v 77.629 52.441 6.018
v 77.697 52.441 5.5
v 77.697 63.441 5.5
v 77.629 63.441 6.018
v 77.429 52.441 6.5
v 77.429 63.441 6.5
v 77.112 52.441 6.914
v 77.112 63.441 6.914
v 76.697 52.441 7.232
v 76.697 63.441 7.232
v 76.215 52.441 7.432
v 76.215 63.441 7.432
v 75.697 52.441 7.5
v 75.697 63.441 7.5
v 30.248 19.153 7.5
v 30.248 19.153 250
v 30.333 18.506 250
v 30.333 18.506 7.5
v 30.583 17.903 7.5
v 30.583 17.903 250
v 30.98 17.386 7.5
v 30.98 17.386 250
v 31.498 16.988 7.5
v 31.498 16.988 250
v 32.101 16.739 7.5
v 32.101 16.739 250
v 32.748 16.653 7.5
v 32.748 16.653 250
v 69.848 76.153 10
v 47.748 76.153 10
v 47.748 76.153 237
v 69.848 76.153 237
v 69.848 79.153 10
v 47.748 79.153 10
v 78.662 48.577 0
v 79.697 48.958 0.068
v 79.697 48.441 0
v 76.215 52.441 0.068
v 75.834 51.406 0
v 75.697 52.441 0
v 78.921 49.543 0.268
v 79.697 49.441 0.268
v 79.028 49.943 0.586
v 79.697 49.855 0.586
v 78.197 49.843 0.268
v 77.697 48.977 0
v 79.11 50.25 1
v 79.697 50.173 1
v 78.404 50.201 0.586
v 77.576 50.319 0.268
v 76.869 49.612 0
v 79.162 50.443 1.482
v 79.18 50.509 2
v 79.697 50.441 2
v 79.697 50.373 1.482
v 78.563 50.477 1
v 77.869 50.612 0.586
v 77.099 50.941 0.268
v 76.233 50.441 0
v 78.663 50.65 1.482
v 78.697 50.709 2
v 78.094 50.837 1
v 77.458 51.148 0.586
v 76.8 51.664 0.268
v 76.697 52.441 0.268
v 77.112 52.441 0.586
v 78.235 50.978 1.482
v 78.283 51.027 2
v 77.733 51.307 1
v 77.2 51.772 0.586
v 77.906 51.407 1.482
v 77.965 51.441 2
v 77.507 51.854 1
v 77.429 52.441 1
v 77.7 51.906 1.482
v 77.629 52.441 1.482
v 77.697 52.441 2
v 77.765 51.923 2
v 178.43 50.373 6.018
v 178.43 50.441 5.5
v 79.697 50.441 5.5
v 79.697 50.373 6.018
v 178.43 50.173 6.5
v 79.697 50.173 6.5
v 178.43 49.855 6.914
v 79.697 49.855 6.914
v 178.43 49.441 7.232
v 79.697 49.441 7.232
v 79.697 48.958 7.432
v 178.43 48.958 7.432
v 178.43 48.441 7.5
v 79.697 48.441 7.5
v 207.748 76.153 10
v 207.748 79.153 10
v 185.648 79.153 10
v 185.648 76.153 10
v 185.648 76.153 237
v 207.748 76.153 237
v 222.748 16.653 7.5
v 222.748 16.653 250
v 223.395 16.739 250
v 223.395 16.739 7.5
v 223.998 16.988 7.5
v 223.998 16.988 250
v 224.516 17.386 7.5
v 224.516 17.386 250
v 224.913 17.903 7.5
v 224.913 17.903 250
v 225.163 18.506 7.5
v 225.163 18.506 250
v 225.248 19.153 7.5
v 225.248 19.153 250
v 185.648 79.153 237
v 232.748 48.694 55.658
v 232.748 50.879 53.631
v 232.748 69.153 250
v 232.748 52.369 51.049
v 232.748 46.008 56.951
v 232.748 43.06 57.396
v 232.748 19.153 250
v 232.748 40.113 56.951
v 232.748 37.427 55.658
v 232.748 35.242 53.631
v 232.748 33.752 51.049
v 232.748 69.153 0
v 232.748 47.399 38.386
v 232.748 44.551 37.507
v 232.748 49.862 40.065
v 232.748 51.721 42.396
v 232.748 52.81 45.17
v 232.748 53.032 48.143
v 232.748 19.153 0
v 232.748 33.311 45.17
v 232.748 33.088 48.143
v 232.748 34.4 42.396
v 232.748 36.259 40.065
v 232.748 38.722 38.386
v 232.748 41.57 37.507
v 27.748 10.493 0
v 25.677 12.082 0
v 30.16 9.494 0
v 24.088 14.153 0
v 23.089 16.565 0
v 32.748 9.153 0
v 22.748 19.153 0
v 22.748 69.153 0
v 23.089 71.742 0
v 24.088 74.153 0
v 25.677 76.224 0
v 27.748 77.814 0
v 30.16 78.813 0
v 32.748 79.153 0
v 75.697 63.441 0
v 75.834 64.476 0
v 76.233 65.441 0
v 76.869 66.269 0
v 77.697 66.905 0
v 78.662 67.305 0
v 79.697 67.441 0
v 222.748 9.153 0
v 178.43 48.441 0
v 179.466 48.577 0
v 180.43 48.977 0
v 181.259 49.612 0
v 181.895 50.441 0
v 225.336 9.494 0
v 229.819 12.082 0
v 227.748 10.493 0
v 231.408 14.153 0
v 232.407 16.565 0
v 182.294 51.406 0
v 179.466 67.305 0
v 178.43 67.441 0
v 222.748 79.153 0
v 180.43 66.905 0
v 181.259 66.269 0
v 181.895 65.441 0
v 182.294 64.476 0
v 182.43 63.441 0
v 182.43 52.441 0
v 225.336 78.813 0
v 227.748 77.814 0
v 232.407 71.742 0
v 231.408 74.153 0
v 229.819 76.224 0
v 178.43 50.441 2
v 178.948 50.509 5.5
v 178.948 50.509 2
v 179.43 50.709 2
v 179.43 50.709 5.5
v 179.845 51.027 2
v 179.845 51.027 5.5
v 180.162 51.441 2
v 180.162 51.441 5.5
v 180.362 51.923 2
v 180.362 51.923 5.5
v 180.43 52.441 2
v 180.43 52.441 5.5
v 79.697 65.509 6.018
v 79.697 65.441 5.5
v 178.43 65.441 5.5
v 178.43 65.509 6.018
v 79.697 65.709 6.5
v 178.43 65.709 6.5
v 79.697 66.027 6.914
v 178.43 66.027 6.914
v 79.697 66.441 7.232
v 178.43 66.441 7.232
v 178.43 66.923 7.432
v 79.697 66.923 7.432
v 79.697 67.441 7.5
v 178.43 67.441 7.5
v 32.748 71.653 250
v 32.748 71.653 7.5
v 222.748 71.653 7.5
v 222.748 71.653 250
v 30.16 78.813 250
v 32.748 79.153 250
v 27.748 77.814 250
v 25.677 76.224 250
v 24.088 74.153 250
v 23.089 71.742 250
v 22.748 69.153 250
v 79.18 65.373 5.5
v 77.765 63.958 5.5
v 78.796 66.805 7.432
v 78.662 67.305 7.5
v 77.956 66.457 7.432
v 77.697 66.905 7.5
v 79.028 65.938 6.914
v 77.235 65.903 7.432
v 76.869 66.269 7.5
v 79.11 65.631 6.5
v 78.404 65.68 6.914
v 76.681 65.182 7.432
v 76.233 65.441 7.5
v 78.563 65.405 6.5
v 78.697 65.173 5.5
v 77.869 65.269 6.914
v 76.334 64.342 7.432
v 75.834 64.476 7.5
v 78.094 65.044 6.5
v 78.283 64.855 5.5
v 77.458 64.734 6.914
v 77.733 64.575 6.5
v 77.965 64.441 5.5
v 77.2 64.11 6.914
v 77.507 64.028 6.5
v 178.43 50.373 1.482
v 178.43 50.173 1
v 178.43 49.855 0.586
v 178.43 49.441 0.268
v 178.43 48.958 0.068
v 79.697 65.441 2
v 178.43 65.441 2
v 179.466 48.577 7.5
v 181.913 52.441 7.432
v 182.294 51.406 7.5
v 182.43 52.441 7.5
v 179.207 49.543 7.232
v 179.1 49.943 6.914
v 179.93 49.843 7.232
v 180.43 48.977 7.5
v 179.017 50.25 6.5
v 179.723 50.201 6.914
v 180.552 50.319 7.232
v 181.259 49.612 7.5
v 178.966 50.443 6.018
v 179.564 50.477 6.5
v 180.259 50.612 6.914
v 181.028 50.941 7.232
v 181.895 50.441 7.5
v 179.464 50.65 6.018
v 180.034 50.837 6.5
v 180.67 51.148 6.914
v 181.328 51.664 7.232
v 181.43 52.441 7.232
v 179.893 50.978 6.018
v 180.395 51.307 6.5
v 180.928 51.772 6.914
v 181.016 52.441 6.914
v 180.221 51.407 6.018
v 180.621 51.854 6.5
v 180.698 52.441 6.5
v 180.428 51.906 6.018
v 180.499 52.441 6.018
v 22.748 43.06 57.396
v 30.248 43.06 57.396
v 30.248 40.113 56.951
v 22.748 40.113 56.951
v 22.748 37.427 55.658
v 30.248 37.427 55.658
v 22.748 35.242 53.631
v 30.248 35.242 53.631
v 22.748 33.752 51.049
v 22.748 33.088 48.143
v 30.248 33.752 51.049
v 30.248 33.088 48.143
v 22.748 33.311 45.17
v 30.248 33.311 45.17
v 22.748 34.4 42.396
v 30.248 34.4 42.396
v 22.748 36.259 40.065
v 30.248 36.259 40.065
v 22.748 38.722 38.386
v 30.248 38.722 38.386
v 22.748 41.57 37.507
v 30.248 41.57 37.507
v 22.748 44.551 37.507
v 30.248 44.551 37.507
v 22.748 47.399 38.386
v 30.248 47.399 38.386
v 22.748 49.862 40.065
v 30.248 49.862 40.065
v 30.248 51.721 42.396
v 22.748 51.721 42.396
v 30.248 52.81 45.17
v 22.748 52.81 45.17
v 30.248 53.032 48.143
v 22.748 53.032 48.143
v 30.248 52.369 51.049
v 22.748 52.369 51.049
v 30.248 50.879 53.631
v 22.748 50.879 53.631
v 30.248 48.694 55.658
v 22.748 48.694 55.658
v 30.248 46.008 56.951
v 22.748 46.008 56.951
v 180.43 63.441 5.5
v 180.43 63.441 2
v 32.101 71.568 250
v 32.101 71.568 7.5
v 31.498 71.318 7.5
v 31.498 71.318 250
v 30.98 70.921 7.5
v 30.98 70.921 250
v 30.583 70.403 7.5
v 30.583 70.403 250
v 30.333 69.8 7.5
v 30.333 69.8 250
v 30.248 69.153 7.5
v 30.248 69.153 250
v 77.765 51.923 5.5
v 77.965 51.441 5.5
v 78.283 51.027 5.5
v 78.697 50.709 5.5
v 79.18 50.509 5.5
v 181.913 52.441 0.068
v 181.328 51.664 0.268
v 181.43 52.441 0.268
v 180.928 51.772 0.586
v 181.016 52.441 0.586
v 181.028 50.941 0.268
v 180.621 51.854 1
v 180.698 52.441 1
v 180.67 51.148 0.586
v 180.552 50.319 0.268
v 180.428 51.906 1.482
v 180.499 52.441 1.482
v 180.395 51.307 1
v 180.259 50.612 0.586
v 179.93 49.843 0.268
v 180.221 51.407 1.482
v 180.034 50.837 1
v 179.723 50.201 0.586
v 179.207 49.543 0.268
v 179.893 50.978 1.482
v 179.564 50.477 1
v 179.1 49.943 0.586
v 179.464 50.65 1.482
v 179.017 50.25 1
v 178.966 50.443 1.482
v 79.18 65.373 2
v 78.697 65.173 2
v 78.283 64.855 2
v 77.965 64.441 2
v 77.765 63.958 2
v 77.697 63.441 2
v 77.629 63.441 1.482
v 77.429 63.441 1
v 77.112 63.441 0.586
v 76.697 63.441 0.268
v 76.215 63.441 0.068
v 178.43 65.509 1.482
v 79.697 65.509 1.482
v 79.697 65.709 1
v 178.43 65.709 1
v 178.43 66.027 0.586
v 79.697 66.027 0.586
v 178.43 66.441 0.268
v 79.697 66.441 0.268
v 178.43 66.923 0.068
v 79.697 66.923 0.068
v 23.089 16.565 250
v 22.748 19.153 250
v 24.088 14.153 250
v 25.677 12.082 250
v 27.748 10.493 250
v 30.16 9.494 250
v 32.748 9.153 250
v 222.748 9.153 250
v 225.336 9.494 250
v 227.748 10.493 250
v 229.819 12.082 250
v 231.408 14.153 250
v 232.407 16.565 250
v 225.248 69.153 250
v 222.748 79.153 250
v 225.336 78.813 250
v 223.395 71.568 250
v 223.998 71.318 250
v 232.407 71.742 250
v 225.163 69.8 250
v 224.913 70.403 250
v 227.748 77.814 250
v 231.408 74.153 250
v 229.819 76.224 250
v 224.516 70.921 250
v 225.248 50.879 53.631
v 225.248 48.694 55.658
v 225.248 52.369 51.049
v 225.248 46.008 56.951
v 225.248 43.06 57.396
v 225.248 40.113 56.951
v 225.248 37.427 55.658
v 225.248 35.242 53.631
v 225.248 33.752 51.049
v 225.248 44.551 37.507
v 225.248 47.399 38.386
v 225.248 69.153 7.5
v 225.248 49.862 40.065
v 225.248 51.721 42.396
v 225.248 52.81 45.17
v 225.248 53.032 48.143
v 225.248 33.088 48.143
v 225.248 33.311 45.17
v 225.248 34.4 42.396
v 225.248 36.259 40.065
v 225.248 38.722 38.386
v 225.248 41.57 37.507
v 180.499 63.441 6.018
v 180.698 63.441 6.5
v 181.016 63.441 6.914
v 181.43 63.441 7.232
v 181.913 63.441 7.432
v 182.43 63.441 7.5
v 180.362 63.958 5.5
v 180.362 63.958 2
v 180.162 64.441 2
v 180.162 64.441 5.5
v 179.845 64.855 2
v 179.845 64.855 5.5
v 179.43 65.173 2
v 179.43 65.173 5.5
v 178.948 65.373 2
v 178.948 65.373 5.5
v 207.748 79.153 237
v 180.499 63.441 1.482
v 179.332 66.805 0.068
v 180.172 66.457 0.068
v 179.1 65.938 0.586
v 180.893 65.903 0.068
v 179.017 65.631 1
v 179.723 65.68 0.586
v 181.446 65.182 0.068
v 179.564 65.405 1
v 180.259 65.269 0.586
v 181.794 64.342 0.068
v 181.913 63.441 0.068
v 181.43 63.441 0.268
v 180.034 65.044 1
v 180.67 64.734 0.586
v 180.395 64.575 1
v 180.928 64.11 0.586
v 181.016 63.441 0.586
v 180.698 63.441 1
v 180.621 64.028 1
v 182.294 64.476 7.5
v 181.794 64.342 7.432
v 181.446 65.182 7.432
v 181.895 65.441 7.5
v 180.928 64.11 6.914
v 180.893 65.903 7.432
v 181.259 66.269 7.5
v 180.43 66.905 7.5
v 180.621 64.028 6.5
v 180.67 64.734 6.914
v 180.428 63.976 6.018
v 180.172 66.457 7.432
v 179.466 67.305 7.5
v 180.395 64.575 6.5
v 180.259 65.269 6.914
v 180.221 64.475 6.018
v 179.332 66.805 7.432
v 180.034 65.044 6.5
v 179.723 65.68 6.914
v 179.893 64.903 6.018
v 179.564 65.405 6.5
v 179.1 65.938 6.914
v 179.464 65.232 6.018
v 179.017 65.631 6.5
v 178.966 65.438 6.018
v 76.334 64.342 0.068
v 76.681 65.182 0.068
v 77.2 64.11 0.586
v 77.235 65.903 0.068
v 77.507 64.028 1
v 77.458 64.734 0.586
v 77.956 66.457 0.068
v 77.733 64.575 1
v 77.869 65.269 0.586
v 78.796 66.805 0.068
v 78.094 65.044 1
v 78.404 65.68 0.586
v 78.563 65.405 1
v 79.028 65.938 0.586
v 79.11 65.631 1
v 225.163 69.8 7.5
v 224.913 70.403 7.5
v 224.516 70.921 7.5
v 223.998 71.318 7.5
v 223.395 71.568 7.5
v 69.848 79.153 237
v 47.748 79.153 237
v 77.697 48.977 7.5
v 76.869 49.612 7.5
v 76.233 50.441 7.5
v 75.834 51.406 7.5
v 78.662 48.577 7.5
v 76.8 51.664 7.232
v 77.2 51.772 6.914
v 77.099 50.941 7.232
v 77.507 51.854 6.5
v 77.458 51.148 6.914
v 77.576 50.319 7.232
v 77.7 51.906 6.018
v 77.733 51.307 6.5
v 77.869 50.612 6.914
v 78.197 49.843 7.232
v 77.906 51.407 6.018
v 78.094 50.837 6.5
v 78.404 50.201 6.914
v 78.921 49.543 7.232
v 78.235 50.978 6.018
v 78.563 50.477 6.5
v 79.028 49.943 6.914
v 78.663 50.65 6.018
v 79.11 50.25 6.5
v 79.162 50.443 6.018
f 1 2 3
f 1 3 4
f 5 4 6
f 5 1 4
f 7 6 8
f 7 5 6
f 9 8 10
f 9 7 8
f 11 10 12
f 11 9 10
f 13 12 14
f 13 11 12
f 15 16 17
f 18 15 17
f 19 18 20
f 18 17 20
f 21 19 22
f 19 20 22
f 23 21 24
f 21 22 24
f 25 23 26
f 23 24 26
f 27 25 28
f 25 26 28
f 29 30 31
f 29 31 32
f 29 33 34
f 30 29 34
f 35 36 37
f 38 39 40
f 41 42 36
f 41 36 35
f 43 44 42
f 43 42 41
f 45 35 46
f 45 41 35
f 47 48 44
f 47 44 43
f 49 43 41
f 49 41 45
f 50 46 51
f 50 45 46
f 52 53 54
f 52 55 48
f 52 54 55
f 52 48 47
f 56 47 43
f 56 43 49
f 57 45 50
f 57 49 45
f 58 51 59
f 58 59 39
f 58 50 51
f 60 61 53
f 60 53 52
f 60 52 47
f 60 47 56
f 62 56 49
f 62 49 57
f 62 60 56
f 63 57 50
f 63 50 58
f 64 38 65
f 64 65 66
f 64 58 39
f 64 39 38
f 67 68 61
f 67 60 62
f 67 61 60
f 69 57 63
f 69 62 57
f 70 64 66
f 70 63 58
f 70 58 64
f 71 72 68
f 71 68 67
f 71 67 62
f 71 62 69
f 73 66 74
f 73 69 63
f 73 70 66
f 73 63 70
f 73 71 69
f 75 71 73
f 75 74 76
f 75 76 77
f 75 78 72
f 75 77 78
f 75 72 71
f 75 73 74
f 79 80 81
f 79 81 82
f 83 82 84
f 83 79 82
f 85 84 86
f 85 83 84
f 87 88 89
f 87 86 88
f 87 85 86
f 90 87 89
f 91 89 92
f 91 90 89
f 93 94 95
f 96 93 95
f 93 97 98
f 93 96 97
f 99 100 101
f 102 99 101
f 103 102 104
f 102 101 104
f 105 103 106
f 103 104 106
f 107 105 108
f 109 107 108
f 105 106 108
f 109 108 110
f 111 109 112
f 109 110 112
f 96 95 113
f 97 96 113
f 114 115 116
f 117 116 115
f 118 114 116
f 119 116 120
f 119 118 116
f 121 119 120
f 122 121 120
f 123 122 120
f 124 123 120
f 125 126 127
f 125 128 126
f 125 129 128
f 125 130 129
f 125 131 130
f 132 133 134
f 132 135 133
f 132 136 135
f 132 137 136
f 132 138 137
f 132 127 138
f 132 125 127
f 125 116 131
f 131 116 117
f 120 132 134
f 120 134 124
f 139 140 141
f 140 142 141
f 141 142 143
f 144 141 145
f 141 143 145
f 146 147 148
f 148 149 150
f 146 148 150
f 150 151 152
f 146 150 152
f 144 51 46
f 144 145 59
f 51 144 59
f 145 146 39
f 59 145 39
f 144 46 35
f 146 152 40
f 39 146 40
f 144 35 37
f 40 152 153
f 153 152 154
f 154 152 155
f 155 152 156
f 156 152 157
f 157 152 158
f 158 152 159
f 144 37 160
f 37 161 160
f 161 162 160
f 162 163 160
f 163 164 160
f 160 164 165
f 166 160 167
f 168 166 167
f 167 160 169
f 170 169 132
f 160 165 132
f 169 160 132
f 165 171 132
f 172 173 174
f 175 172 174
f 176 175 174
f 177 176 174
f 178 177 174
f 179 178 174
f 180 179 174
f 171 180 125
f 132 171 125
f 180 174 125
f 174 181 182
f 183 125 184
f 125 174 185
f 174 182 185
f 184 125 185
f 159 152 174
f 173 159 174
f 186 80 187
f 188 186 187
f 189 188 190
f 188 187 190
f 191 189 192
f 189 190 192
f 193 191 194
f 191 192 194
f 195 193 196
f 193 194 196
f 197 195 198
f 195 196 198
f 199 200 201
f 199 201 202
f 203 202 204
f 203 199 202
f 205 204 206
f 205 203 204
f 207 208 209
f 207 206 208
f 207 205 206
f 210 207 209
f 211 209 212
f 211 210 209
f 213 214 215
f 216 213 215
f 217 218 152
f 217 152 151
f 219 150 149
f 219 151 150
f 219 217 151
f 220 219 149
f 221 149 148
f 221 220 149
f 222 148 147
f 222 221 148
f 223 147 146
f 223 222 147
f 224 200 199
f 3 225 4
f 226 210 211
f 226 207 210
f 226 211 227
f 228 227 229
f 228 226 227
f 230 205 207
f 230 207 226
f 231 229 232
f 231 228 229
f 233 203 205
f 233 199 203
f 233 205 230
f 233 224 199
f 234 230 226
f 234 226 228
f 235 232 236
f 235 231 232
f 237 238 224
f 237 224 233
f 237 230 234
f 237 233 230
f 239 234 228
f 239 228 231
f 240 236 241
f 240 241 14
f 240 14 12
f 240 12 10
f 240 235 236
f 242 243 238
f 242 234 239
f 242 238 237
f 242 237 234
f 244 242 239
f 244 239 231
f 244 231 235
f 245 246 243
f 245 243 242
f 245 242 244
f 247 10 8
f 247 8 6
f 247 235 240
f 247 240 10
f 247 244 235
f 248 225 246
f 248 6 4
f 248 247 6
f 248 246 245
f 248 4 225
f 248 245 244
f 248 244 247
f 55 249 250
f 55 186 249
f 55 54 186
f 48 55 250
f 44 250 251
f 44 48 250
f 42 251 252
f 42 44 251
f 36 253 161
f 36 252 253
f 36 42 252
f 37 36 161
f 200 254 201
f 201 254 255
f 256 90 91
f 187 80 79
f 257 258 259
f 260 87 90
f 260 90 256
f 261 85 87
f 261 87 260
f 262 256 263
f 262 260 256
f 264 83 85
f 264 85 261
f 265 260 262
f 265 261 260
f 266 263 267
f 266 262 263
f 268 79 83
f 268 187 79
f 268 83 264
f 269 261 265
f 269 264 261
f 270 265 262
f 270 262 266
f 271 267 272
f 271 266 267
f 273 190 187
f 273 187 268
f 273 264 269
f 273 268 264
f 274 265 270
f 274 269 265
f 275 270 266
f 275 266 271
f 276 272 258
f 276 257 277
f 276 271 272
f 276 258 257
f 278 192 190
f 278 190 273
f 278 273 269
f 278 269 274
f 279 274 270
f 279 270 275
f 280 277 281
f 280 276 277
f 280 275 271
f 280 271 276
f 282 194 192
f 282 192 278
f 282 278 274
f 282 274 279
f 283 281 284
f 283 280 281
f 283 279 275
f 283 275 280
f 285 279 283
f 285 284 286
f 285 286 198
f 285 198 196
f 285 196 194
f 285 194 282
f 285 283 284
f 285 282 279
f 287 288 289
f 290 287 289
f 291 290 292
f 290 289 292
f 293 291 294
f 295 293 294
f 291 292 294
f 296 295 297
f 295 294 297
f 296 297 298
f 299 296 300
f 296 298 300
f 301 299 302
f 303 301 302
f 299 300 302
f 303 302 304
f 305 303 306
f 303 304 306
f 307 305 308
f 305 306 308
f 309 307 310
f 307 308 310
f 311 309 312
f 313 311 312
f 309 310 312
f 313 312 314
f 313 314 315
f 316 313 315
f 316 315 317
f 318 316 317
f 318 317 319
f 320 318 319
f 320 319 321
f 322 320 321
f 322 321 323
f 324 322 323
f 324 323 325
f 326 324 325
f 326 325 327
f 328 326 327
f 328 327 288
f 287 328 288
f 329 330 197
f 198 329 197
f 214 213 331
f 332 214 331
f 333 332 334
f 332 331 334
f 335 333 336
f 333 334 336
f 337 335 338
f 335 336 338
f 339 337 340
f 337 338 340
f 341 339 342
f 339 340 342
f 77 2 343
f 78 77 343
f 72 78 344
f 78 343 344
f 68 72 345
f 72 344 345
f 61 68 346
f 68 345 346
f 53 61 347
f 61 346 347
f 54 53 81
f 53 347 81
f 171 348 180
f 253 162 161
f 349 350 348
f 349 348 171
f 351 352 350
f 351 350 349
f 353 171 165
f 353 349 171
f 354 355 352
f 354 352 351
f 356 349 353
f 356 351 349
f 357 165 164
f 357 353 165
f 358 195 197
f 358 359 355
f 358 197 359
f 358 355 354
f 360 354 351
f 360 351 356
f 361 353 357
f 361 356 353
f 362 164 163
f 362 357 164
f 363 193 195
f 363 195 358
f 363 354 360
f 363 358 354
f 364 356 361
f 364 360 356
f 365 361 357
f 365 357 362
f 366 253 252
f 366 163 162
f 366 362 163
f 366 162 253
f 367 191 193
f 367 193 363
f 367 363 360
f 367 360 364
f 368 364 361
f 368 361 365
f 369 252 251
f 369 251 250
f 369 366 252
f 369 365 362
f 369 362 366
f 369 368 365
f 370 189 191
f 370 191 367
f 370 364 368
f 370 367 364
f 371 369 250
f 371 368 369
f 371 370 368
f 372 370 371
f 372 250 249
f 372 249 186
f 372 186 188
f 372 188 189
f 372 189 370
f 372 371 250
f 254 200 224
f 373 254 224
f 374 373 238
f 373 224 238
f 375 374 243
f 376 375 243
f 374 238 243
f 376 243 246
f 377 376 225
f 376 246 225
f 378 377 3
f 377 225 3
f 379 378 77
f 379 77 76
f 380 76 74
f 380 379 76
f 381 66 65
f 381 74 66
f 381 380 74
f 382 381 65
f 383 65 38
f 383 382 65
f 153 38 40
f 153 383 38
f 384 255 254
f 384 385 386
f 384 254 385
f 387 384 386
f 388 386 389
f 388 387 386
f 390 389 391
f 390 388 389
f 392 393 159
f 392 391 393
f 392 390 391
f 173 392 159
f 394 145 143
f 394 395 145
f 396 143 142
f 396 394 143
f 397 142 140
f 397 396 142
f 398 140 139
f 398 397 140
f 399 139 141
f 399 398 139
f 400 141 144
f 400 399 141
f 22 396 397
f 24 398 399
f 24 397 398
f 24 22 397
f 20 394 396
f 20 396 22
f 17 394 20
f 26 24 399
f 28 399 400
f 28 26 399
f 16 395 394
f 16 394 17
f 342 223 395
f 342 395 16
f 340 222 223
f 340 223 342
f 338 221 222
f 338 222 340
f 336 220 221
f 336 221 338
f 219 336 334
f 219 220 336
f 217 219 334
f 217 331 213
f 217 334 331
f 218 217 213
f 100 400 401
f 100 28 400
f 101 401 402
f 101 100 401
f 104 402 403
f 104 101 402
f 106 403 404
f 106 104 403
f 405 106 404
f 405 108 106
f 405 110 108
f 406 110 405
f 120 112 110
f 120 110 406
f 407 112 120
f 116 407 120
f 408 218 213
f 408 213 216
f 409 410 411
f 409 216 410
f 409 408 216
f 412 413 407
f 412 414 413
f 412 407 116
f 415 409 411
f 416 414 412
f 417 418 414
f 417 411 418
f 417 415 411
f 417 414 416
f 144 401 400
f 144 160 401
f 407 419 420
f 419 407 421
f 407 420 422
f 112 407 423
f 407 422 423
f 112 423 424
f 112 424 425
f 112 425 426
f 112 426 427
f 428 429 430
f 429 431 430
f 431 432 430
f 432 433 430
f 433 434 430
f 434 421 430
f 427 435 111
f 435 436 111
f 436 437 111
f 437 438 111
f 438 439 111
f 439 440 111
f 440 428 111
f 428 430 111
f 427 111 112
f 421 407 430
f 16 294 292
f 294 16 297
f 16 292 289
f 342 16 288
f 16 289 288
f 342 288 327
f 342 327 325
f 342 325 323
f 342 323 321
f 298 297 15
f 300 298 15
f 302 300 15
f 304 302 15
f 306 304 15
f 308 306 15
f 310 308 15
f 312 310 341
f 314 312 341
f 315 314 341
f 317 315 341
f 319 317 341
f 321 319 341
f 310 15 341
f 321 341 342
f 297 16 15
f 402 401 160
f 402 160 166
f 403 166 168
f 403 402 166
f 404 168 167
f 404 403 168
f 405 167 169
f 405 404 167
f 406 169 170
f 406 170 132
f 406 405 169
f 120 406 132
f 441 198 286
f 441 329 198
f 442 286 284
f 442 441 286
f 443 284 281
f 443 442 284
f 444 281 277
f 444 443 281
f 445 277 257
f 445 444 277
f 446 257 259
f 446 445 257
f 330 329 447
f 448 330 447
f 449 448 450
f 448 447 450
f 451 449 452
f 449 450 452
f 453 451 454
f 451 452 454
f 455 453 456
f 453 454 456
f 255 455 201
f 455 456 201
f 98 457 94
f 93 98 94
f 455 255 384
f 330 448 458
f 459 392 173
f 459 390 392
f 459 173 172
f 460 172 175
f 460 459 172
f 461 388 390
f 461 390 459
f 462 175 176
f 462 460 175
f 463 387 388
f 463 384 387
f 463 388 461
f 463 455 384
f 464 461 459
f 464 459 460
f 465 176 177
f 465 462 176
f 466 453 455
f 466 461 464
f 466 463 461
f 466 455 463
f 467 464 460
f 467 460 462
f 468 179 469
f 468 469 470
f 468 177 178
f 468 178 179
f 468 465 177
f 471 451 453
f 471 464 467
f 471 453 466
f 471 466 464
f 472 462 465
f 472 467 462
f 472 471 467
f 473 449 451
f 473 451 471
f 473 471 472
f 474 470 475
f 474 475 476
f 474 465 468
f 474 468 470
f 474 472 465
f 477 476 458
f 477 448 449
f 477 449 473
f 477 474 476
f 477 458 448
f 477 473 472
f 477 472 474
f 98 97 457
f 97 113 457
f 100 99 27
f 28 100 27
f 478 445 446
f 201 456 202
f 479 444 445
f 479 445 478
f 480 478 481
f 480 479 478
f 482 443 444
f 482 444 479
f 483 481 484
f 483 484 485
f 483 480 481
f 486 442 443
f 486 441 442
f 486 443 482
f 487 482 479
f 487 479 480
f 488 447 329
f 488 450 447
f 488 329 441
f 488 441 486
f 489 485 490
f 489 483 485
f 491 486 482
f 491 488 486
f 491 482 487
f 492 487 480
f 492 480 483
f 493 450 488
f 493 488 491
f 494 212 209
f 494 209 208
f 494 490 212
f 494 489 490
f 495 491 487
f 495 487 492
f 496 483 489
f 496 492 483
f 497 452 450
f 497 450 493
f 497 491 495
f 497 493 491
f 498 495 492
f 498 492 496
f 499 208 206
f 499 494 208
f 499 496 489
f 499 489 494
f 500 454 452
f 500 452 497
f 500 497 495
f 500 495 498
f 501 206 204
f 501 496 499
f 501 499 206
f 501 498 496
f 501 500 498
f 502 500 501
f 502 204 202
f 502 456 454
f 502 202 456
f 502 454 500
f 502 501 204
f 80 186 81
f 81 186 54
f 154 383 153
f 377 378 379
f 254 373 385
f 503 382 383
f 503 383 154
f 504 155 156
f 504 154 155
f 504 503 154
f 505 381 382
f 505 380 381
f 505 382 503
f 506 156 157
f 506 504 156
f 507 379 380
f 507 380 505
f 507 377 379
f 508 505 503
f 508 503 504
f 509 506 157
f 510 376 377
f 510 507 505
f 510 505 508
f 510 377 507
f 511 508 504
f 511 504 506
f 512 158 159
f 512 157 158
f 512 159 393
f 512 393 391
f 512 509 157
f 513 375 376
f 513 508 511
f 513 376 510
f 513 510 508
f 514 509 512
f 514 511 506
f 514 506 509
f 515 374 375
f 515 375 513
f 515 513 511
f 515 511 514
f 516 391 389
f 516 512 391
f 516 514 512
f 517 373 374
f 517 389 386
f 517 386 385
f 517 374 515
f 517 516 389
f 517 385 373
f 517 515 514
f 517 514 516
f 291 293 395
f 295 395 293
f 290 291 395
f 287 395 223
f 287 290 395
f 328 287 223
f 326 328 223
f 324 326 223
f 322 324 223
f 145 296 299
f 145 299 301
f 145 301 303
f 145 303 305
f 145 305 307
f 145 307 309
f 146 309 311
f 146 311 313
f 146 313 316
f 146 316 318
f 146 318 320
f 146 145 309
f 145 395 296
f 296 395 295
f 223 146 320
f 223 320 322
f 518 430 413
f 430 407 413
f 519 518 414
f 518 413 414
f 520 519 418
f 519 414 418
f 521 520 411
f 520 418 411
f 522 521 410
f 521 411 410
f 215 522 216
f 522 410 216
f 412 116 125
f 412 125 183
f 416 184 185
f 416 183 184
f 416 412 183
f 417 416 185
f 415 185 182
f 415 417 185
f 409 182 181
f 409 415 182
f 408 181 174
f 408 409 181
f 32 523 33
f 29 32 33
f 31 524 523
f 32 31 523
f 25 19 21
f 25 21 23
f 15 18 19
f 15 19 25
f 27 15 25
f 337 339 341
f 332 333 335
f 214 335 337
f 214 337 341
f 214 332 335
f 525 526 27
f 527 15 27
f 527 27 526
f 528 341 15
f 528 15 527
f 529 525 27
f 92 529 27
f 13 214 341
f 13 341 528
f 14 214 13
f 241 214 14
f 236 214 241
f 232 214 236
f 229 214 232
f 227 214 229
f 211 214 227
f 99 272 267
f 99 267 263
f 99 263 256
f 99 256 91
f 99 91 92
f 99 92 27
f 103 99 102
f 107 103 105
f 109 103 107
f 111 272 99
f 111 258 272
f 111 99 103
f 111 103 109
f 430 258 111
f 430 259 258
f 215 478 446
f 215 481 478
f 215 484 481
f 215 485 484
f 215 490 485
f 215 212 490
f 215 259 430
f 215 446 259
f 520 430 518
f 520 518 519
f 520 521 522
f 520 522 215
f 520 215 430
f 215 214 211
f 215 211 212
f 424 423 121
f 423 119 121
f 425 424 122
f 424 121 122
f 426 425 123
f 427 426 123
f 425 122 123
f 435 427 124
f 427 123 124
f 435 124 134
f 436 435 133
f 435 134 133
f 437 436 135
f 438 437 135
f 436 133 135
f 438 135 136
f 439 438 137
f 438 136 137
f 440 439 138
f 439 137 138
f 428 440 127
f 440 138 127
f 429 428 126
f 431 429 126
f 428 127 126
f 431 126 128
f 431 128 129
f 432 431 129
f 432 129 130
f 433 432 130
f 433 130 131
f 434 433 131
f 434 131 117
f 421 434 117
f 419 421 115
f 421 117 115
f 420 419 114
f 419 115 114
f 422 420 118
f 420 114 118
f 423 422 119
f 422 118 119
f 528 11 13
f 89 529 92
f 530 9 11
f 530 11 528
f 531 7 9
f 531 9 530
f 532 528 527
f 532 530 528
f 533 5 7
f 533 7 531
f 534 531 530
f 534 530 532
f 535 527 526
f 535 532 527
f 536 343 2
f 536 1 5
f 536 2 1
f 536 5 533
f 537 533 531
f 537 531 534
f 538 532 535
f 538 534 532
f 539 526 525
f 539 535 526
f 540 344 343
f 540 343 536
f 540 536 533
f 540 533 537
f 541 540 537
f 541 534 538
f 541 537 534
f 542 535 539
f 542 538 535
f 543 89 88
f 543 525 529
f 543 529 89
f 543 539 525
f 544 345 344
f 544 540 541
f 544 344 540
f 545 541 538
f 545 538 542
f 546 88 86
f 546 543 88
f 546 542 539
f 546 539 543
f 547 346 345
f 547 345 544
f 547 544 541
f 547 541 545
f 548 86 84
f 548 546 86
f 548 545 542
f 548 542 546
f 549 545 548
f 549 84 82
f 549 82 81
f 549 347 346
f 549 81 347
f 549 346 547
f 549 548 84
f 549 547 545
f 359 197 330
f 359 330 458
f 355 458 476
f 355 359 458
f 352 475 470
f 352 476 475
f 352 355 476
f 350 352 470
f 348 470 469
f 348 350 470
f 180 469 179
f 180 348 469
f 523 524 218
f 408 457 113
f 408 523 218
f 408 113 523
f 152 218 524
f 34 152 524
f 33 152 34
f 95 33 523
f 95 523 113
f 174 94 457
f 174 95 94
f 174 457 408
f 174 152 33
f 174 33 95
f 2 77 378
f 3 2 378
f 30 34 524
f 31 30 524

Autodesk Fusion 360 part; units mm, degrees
sketch "Sketch1" plane through (0, 0, 0) normal (0, 0, 1) x (1, 0, 0)
  line L0 (22.7481, 79.1534) -> (232.7481, 79.1534)
  line L1 (232.7481, 79.1534) -> (232.7481, 9.1534)
  line L2 (232.7481, 9.1534) -> (22.7481, 9.1534)
  line L3 (22.7481, 9.1534) -> (22.7481, 79.1534)
extrude "Extrude1" add sketch "Sketch1" along normal blind 250
fillet "Fillet1" radius 10 1 edges at (22.7481, 9.1534, 125)
fillet "Fillet2" radius 10 1 edges at (232.7481, 9.1534, 125)
fillet "Fillet3" radius 10 1 edges at (22.7481, 79.1534, 125)
fillet "Fillet4" radius 10 1 edges at (232.7481, 79.1534, 125)
shell "Shell1" thickness 7.5 removed faces 1 at (159.4147, 32.4867, 250)
sketch "Sketch2" plane through (0, 0, 0) normal (0, 0, 1) x (1, 0, 0)
  line L0 (180.4304, 50.4408) -> (77.6973, 50.4408)
  line L1 (77.6973, 50.4408) -> (77.6973, 65.4408)
  line L2 (77.6973, 65.4408) -> (180.4304, 65.4408)
  line L3 (180.4304, 65.4408) -> (180.4304, 50.4408)
  line L4 (180.4304, 50.4408) -> (77.6973, 65.4408) construction
  line L5 (77.6973, 50.4408) -> (180.4304, 65.4408) construction
  point P0 (129.0638, 57.9408)
extrude "Extrude2" cut sketch "Sketch2" along normal blind 24
fillet "Fillet5" radius 2 12 edges at (129.0638, 65.4408, 0) (129.0638, 50.4408, 0) (77.6973, 57.9408, 0) (180.4304, 57.9408, 0) (77.6973, 50.4408, 3.75) (129.0638, 65.4408, 7.5) (77.6973, 57.9408, 7.5) (77.6973, 65.4408, 3.75) (180.4304, 50.4408, 3.75) (180.4304, 65.4408, 3.75) (180.4304, 57.9408, 7.5) (129.0638, 50.4408, 7.5) 4 faces at (77.6973, 55.4408, 2.5) (146.186, 50.4408, 2.5) (180.4304, 60.4408, 5) (111.9416, 65.4408, 2.5)
sketch "Sketch3" plane through (0, 0, 0) normal (0, 0, -1) x (1, 0, 0)
  arc A0 (222.7481, -79.1534) -> (232.7481, -69.1534) centre (222.7481, -69.1534) ccw
  line L0 (232.7481, -69.1534) -> (232.7481, -19.1534)
  arc A1 (232.7481, -19.1534) -> (222.7481, -9.1534) centre (222.7481, -19.1534) ccw
  line L1 (222.7481, -9.1534) -> (32.7481, -9.1534)
  arc A2 (32.7481, -9.1534) -> (22.7481, -19.1534) centre (32.7481, -19.1534) ccw
  line L2 (22.7481, -19.1534) -> (22.7481, -69.1534)
  arc A3 (22.7481, -69.1534) -> (32.7481, -79.1534) centre (32.7481, -69.1534) ccw
  line L3 (32.7481, -79.1534) -> (222.7481, -79.1534)
  arc A4 (178.4304, -67.4408) -> (182.4304, -63.4408) centre (178.4304, -63.4408) ccw
  line L4 (178.4304, -67.4408) -> (79.6973, -67.4408)
  arc A5 (75.6973, -63.4408) -> (79.6973, -67.4408) centre (79.6973, -63.4408) ccw
  line L5 (75.6973, -63.4408) -> (75.6973, -52.4408)
  arc A6 (79.6973, -48.4408) -> (75.6973, -52.4408) centre (79.6973, -52.4408) ccw
  line L6 (79.6973, -48.4408) -> (178.4304, -48.4408)
  arc A7 (182.4304, -52.4408) -> (178.4304, -48.4408) centre (178.4304, -52.4408) ccw
  line L7 (182.4304, -52.4408) -> (182.4304, -63.4408)
hole "Hole1" at (22.7481, 43.0604, 47.3957) direction (1, 0, 0) diameter 20 depth 300 tip angle 118
ref_plane "WorkPlane1" through (127.7481, 79.1534, 125) normal (0, 1, 0) x (-1, 0, 0)
sketch "Sketch4" plane through (0, 79.1534, 0) normal (0, 1, 0) x (1, 0, 0)
  line L0 (207.7481, -10) -> (185.6481, -10)
  line L1 (185.6481, -10) -> (185.6481, -237)
  line L2 (185.6481, -237) -> (207.7481, -237)
  line L3 (207.7481, -237) -> (207.7481, -10)
  line L4 (32.7481, 0) -> (222.7481, 0)
  line L5 (222.7481, 0) -> (222.7481, -250)
  line L6 (207.7481, -10) -> (185.6481, -10)
  line L7 (185.6481, -10) -> (185.6481, -237)
  line L8 (185.6481, -237) -> (207.7481, -237)
  line L9 (207.7481, -237) -> (207.7481, -10)
  line L10 (69.8481, -10) -> (47.7481, -10)
  line L11 (47.7481, -10) -> (47.7481, -237)
  line L12 (47.7481, -237) -> (69.8481, -237)
  line L13 (69.8481, -237) -> (69.8481, -10)
  line L14 (32.7481, -250) -> (32.7481, 0)
  dimension "d25" = 10
  dimension "d26" = 15
  dimension "d27" = 22.1
  dimension "d28" = 227
  dimension "d29" = 227
  dimension "d30" = 22.1
  dimension "d31" = 10
  dimension "d32" = 15
extrude "Extrude3" cut sketch "Sketch4" against normal blind 3
